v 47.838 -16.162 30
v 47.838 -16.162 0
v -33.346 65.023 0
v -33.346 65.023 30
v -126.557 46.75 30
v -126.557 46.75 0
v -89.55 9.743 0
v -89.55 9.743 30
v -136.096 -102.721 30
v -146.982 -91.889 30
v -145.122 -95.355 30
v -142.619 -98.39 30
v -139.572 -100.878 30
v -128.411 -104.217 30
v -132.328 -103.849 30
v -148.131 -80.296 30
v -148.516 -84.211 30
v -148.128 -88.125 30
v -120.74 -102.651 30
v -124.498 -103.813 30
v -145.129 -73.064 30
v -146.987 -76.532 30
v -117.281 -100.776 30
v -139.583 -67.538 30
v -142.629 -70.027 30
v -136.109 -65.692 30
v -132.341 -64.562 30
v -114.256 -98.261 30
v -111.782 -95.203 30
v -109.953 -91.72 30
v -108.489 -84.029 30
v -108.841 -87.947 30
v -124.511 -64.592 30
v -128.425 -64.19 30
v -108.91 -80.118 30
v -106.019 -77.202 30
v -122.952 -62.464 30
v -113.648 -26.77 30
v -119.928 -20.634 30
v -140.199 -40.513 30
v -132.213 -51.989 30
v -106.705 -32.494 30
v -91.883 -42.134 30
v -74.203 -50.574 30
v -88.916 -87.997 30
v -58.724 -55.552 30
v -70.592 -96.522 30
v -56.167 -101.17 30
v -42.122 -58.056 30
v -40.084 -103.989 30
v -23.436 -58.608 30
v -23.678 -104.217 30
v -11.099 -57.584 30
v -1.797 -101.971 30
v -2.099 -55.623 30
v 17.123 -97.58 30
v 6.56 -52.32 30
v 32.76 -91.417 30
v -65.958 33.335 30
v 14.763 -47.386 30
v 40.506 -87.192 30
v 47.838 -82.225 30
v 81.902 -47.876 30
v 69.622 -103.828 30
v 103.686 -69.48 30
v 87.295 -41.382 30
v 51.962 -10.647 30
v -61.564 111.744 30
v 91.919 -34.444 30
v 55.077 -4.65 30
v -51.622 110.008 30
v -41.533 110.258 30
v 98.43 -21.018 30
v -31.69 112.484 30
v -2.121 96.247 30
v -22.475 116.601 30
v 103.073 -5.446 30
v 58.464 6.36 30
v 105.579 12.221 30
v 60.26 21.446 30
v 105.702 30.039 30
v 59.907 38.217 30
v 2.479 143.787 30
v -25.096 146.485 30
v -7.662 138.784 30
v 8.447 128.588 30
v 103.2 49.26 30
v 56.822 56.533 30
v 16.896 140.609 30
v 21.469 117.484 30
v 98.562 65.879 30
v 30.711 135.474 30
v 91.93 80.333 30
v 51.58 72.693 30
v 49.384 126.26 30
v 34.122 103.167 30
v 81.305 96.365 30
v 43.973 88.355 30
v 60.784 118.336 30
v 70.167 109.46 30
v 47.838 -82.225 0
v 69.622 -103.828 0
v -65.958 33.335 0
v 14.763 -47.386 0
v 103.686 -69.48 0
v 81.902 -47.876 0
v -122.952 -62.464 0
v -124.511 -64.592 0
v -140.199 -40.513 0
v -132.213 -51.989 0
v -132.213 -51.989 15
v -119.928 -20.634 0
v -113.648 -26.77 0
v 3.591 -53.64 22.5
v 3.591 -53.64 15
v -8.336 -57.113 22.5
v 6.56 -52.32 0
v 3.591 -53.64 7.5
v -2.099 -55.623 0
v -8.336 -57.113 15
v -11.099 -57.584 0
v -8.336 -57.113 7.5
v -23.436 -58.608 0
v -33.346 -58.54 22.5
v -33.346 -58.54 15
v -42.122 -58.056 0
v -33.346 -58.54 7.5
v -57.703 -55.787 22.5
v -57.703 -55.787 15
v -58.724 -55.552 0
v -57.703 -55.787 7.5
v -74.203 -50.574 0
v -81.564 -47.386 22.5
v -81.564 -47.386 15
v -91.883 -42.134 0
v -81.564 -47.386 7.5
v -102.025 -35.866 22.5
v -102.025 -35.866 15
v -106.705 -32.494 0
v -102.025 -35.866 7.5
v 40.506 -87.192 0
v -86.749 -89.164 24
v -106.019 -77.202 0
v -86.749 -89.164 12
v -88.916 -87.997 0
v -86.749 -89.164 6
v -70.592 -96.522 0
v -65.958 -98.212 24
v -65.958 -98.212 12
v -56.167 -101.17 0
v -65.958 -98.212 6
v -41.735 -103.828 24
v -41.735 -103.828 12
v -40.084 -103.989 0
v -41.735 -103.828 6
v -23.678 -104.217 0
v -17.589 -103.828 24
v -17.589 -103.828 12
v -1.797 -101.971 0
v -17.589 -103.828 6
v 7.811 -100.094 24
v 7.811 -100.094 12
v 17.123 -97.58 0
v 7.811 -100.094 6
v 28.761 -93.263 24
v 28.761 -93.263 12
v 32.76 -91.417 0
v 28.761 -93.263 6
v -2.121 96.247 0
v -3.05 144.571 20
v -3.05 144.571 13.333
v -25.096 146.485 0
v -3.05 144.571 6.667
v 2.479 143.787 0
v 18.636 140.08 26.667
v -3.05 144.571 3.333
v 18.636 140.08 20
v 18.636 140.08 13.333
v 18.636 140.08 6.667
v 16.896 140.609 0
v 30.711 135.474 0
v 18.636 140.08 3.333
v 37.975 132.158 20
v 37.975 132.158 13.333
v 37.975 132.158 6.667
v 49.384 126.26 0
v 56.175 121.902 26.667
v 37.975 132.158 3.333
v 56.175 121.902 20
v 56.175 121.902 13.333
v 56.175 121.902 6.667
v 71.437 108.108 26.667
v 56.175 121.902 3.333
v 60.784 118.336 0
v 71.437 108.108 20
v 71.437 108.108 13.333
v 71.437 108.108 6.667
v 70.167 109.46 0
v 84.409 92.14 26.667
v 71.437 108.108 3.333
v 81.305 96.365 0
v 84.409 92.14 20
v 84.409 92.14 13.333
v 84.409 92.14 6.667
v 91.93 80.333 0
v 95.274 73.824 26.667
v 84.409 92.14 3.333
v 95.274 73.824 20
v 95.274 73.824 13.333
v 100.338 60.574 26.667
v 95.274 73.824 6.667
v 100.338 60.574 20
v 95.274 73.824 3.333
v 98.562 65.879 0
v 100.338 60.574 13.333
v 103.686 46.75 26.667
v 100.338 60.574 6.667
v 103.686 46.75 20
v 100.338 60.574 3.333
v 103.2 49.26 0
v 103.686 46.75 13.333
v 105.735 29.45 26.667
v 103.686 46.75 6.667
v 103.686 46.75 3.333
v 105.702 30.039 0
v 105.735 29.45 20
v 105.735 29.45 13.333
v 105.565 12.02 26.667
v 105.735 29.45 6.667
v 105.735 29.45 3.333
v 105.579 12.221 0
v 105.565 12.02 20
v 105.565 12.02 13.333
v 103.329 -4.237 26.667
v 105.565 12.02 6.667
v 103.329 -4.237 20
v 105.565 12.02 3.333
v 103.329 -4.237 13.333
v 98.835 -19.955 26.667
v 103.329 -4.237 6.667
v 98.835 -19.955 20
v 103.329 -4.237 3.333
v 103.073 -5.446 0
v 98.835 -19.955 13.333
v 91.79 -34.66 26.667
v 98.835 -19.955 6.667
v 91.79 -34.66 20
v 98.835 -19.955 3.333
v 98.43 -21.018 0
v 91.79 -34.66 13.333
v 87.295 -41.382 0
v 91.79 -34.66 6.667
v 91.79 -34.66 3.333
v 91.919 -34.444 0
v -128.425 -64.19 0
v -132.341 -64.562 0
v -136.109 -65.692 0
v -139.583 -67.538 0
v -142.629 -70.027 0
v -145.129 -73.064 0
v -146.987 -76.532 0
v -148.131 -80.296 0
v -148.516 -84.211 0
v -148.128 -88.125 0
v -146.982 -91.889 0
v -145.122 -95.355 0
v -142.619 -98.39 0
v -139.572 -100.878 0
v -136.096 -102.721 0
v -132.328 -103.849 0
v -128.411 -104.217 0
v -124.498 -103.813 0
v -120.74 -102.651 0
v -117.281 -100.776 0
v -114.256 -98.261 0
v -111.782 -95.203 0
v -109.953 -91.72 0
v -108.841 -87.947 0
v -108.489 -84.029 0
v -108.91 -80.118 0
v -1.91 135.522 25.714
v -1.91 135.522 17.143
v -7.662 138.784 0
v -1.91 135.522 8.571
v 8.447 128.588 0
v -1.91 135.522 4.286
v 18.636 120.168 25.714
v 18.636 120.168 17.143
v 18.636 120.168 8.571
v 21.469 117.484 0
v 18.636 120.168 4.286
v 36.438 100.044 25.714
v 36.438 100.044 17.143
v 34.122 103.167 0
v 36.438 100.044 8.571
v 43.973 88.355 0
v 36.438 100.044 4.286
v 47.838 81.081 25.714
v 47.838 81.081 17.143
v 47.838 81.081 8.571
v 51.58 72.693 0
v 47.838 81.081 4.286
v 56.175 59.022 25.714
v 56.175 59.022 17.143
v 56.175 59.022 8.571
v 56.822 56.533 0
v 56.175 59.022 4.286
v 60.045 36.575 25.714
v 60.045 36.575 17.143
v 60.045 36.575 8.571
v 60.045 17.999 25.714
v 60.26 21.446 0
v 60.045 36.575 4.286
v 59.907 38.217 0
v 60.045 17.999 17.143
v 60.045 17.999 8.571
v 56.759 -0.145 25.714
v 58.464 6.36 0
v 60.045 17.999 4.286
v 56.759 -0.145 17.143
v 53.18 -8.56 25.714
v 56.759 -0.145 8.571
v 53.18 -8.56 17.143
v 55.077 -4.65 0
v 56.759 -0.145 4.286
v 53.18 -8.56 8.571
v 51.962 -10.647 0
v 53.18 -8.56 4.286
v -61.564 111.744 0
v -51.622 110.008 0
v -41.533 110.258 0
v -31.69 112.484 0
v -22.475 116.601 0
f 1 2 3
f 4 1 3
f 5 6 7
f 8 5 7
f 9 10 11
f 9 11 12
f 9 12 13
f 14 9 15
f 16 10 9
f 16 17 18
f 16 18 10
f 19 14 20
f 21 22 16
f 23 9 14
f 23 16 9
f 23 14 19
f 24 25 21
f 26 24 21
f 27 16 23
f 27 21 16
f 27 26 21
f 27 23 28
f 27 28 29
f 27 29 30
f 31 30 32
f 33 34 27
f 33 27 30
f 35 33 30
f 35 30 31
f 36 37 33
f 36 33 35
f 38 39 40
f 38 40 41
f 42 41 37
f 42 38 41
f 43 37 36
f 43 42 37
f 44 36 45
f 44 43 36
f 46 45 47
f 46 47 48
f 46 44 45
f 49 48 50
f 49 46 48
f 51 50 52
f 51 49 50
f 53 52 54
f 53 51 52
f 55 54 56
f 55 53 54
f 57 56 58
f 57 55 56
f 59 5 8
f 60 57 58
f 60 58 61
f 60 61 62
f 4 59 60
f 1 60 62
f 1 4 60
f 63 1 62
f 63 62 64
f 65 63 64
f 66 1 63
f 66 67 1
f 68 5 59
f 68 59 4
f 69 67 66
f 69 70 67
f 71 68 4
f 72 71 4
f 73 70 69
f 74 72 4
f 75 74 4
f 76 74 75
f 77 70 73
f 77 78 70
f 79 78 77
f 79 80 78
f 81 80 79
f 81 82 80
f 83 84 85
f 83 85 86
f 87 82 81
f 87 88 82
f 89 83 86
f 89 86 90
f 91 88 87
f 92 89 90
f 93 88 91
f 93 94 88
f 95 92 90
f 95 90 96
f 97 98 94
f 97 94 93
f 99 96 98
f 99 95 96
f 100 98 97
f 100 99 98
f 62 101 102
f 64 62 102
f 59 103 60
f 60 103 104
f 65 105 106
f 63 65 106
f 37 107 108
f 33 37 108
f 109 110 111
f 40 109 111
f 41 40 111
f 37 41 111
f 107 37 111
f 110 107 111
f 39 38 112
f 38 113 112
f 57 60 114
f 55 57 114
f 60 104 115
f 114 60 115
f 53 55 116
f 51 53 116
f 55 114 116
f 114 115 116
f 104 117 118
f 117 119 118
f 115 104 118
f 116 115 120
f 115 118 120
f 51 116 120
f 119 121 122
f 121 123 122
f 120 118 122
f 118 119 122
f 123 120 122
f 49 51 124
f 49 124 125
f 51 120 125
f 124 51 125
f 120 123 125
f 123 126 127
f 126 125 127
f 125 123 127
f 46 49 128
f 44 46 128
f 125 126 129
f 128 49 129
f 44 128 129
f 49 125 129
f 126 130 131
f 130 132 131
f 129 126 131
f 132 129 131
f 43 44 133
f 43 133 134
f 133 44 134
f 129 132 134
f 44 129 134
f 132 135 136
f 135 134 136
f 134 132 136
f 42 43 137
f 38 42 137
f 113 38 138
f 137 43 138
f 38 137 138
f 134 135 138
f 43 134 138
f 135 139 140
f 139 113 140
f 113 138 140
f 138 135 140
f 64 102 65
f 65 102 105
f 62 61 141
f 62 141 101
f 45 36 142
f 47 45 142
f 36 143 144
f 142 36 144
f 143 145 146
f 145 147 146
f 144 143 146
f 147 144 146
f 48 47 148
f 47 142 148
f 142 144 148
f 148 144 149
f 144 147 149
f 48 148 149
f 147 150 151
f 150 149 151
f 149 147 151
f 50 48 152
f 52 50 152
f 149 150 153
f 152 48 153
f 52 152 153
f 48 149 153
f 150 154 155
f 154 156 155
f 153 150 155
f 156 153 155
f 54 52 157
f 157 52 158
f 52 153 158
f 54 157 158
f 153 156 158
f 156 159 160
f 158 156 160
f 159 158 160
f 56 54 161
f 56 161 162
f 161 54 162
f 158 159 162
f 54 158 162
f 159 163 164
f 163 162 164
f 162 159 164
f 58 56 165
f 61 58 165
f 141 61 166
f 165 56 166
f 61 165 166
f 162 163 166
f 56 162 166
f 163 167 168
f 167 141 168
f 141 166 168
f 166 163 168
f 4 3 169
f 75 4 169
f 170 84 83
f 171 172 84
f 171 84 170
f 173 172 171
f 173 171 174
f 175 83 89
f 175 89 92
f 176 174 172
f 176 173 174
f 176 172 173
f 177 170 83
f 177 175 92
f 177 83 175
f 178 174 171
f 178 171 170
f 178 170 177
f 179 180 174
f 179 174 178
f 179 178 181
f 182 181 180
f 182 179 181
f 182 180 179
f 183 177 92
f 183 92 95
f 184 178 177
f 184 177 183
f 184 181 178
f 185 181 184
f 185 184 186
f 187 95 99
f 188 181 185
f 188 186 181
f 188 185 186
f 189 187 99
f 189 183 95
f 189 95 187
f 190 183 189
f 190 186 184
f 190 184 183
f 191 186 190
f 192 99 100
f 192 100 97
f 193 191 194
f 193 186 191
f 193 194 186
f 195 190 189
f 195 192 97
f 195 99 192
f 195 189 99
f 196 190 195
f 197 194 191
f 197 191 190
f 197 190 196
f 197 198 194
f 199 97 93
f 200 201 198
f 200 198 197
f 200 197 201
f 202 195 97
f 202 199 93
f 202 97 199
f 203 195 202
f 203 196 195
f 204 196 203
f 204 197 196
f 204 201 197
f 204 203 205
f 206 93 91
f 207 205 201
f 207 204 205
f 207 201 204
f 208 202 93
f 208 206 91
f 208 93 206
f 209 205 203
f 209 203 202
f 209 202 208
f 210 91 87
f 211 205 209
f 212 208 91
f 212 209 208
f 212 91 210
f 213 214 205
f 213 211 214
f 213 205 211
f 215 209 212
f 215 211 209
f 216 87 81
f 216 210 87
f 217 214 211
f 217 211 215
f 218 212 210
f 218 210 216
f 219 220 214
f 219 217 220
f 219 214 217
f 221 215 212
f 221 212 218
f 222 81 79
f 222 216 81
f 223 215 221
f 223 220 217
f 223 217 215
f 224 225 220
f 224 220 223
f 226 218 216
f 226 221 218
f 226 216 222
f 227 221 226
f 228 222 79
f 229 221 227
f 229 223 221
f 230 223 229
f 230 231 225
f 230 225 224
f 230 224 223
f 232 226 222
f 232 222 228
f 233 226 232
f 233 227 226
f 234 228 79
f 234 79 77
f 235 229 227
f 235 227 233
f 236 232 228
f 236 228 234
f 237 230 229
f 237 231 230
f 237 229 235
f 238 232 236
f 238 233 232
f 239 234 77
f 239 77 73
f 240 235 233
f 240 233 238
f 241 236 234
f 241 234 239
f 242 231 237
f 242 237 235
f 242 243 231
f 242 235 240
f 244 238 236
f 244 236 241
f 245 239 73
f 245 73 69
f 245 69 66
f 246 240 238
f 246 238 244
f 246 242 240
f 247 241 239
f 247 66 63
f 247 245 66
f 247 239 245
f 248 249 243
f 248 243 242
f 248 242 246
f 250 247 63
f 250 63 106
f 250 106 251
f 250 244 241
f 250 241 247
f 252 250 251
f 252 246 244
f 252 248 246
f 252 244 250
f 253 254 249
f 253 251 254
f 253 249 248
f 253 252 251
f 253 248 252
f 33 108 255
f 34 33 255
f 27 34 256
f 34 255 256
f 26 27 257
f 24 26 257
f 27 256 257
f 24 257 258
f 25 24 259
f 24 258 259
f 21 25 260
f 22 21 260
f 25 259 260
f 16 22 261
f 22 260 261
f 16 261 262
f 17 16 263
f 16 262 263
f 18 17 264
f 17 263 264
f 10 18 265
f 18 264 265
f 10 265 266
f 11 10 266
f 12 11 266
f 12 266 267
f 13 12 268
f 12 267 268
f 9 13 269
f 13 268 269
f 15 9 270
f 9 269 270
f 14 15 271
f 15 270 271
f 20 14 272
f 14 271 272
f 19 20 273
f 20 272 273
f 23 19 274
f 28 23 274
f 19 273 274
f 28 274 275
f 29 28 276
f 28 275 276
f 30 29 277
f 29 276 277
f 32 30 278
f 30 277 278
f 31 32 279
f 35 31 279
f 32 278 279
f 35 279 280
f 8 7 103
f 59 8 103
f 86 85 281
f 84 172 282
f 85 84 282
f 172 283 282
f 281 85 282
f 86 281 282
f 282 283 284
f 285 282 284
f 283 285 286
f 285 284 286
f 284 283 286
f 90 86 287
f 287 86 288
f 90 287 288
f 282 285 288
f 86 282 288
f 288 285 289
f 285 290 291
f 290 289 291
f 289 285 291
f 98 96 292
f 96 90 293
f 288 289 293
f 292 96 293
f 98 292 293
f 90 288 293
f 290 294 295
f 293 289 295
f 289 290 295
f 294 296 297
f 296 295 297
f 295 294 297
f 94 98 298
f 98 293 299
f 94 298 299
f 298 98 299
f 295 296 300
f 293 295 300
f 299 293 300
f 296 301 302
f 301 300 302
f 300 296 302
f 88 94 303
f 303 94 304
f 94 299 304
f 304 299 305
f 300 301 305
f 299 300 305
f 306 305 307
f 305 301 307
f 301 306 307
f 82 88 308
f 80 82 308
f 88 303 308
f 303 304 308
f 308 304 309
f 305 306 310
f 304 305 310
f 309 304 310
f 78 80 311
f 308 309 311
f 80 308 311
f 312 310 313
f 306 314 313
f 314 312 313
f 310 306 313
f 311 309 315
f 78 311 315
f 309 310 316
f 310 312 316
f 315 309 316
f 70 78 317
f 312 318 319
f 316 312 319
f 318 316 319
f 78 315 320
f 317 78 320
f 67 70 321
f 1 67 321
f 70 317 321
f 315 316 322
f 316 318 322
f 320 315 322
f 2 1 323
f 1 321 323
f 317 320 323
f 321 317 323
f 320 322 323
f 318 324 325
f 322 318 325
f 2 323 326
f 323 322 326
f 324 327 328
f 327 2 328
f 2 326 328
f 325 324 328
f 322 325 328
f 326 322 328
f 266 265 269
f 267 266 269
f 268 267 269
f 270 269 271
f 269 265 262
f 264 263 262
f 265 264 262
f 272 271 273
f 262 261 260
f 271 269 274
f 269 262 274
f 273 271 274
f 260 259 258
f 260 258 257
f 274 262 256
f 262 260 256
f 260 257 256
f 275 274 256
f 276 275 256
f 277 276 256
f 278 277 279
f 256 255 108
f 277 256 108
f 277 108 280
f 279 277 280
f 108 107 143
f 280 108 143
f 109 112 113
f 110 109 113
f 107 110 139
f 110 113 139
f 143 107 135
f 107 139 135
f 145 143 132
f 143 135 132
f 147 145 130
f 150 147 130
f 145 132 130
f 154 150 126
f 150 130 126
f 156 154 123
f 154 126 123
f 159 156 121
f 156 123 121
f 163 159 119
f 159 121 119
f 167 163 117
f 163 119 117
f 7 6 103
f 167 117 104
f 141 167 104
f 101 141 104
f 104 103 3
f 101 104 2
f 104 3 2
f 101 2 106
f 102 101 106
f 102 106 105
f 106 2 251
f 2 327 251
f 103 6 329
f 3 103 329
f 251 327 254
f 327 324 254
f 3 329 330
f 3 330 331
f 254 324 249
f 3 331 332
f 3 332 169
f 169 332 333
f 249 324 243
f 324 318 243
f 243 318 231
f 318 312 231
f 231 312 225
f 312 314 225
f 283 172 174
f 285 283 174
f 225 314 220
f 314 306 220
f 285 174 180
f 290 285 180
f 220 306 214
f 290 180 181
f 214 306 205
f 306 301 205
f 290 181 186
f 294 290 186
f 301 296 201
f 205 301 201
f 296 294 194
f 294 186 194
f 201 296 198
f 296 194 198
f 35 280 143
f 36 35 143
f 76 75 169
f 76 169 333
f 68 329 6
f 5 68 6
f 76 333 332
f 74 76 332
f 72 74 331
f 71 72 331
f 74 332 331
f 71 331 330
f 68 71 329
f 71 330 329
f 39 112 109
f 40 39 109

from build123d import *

# Parameters (mm, degrees)
EXTRUDE_1_DEPTH = 30


with BuildPart() as part:
    # 草图1 → 凸台-拉伸1 (new body)
    with BuildSketch(Plane.XY):
        with BuildLine():
            Line((-89.550424061, 9.743331503), (-65.958441791, 33.335313773))
            Line((-65.958441791, 33.335313773), (14.763144604, -47.386272621))
            add(Edge.make_bspline(
                [(14.763144604, -47.386272621), (0.494407811, -57.892318184), (-24.857012127, -59.689840271), (-58.186688521, -56.851240275), (-88.692238529, -45.382338902), (-109.075510722, -32.199451169), (-119.928178624, -20.63442306)],
                knots=[0, 0, 0, 0, 0.341115549, 0.507979438, 0.680177262, 1, 1, 1, 1], degree=3))
            Line((-119.928178624, -20.63442306), (-140.199044416, -40.51331885))
            add(Edge.make_bspline(
                [(-140.199044416, -40.51331885), (-132.851023827, -52.488780749), (-122.952075778, -62.464006208)],
                knots=[0, 0, 0, 1, 1, 1], degree=2))
            Line((-122.952075778, -62.464006208), (-124.511456774, -64.591840844))
            ThreePointArc((-124.511456774, -64.591840844), (-142.61936624, -98.390264744), (-108.909761073, -80.117542921))
            Line((-108.909761073, -80.117542921), (-106.018688387, -77.202324863))
            add(Edge.make_bspline(
                [(-106.018688387, -77.202324863), (-93.714859758, -86.031565942), (-72.92911338, -97.233004689), (-42.077489767, -104.91243417), (-17.024761238, -104.223351741), (14.056661387, -100.072035401), (36.008728716, -91.143735824), (47.83817857, -82.224550687)],
                knots=[0, 0, 0, 0, 0.276360348, 0.427878613, 0.575006209, 0.731440466, 1, 1, 1, 1], degree=3))
            Line((47.83817857, -82.224550687), (69.622057976, -103.828004523))
            Line((69.622057976, -103.828004523), (103.685759612, -69.479813065))
            Line((103.685759612, -69.479813065), (81.901880206, -47.876359228))
            add(Edge.make_bspline(
                [(-25.095901705, 146.484591642), (-10.567098374, 145.498050051), (11.160613299, 144.072831183), (37.531334045, 132.583388034), (55.897612016, 123.332823339), (71.537157173, 108.672601965), (84.710460364, 92.54260553), (97.252459301, 72.155728995), (105.276260592, 44.815754295), (107.60340097, 1.722304289), (97.111827436, -31.457580928), (81.901880206, -47.876359228)],
                knots=[0, 0, 0, 0, 0.159868672, 0.229200296, 0.310741288, 0.380982582, 0.45929677, 0.536185558, 0.638541511, 0.764116301, 1, 1, 1, 1], degree=3))
            add(Edge.make_bspline(
                [(-25.095901705, 146.484591642), (-8.963236942, 140.754746766), (13.87303757, 127.036506772), (36.100717553, 101.745358423), (48.669739491, 80.953224615), (56.825285706, 59.482294206), (60.519405197, 37.995942764), (60.521784194, 11.949353151), (56.293651863, -6.693592279), (47.83817857, -16.161590205)],
                knots=[0, 0, 0, 0, 0.253918506, 0.386919221, 0.496446637, 0.613180361, 0.7259311, 0.817885326, 1, 1, 1, 1], degree=3))
            Line((47.83817857, -16.161590205), (-33.345995712, 65.022584077))
            Line((-33.345995712, 65.022584077), (-2.121313296, 96.247266493))
            Line((-2.121313296, 96.247266493), (-22.475180352, 116.60113355))
            ThreePointArc((-22.475180352, 116.60113355), (-41.533061284, 110.257723938), (-61.563856858, 111.74396073))
            Line((-61.563856858, 111.74396073), (-126.557455073, 46.750362515))
            Line((-126.557455073, 46.750362515), (-89.550424061, 9.743331503))
        make_face()
    extrude(amount=EXTRUDE_1_DEPTH)


solid = part.part
